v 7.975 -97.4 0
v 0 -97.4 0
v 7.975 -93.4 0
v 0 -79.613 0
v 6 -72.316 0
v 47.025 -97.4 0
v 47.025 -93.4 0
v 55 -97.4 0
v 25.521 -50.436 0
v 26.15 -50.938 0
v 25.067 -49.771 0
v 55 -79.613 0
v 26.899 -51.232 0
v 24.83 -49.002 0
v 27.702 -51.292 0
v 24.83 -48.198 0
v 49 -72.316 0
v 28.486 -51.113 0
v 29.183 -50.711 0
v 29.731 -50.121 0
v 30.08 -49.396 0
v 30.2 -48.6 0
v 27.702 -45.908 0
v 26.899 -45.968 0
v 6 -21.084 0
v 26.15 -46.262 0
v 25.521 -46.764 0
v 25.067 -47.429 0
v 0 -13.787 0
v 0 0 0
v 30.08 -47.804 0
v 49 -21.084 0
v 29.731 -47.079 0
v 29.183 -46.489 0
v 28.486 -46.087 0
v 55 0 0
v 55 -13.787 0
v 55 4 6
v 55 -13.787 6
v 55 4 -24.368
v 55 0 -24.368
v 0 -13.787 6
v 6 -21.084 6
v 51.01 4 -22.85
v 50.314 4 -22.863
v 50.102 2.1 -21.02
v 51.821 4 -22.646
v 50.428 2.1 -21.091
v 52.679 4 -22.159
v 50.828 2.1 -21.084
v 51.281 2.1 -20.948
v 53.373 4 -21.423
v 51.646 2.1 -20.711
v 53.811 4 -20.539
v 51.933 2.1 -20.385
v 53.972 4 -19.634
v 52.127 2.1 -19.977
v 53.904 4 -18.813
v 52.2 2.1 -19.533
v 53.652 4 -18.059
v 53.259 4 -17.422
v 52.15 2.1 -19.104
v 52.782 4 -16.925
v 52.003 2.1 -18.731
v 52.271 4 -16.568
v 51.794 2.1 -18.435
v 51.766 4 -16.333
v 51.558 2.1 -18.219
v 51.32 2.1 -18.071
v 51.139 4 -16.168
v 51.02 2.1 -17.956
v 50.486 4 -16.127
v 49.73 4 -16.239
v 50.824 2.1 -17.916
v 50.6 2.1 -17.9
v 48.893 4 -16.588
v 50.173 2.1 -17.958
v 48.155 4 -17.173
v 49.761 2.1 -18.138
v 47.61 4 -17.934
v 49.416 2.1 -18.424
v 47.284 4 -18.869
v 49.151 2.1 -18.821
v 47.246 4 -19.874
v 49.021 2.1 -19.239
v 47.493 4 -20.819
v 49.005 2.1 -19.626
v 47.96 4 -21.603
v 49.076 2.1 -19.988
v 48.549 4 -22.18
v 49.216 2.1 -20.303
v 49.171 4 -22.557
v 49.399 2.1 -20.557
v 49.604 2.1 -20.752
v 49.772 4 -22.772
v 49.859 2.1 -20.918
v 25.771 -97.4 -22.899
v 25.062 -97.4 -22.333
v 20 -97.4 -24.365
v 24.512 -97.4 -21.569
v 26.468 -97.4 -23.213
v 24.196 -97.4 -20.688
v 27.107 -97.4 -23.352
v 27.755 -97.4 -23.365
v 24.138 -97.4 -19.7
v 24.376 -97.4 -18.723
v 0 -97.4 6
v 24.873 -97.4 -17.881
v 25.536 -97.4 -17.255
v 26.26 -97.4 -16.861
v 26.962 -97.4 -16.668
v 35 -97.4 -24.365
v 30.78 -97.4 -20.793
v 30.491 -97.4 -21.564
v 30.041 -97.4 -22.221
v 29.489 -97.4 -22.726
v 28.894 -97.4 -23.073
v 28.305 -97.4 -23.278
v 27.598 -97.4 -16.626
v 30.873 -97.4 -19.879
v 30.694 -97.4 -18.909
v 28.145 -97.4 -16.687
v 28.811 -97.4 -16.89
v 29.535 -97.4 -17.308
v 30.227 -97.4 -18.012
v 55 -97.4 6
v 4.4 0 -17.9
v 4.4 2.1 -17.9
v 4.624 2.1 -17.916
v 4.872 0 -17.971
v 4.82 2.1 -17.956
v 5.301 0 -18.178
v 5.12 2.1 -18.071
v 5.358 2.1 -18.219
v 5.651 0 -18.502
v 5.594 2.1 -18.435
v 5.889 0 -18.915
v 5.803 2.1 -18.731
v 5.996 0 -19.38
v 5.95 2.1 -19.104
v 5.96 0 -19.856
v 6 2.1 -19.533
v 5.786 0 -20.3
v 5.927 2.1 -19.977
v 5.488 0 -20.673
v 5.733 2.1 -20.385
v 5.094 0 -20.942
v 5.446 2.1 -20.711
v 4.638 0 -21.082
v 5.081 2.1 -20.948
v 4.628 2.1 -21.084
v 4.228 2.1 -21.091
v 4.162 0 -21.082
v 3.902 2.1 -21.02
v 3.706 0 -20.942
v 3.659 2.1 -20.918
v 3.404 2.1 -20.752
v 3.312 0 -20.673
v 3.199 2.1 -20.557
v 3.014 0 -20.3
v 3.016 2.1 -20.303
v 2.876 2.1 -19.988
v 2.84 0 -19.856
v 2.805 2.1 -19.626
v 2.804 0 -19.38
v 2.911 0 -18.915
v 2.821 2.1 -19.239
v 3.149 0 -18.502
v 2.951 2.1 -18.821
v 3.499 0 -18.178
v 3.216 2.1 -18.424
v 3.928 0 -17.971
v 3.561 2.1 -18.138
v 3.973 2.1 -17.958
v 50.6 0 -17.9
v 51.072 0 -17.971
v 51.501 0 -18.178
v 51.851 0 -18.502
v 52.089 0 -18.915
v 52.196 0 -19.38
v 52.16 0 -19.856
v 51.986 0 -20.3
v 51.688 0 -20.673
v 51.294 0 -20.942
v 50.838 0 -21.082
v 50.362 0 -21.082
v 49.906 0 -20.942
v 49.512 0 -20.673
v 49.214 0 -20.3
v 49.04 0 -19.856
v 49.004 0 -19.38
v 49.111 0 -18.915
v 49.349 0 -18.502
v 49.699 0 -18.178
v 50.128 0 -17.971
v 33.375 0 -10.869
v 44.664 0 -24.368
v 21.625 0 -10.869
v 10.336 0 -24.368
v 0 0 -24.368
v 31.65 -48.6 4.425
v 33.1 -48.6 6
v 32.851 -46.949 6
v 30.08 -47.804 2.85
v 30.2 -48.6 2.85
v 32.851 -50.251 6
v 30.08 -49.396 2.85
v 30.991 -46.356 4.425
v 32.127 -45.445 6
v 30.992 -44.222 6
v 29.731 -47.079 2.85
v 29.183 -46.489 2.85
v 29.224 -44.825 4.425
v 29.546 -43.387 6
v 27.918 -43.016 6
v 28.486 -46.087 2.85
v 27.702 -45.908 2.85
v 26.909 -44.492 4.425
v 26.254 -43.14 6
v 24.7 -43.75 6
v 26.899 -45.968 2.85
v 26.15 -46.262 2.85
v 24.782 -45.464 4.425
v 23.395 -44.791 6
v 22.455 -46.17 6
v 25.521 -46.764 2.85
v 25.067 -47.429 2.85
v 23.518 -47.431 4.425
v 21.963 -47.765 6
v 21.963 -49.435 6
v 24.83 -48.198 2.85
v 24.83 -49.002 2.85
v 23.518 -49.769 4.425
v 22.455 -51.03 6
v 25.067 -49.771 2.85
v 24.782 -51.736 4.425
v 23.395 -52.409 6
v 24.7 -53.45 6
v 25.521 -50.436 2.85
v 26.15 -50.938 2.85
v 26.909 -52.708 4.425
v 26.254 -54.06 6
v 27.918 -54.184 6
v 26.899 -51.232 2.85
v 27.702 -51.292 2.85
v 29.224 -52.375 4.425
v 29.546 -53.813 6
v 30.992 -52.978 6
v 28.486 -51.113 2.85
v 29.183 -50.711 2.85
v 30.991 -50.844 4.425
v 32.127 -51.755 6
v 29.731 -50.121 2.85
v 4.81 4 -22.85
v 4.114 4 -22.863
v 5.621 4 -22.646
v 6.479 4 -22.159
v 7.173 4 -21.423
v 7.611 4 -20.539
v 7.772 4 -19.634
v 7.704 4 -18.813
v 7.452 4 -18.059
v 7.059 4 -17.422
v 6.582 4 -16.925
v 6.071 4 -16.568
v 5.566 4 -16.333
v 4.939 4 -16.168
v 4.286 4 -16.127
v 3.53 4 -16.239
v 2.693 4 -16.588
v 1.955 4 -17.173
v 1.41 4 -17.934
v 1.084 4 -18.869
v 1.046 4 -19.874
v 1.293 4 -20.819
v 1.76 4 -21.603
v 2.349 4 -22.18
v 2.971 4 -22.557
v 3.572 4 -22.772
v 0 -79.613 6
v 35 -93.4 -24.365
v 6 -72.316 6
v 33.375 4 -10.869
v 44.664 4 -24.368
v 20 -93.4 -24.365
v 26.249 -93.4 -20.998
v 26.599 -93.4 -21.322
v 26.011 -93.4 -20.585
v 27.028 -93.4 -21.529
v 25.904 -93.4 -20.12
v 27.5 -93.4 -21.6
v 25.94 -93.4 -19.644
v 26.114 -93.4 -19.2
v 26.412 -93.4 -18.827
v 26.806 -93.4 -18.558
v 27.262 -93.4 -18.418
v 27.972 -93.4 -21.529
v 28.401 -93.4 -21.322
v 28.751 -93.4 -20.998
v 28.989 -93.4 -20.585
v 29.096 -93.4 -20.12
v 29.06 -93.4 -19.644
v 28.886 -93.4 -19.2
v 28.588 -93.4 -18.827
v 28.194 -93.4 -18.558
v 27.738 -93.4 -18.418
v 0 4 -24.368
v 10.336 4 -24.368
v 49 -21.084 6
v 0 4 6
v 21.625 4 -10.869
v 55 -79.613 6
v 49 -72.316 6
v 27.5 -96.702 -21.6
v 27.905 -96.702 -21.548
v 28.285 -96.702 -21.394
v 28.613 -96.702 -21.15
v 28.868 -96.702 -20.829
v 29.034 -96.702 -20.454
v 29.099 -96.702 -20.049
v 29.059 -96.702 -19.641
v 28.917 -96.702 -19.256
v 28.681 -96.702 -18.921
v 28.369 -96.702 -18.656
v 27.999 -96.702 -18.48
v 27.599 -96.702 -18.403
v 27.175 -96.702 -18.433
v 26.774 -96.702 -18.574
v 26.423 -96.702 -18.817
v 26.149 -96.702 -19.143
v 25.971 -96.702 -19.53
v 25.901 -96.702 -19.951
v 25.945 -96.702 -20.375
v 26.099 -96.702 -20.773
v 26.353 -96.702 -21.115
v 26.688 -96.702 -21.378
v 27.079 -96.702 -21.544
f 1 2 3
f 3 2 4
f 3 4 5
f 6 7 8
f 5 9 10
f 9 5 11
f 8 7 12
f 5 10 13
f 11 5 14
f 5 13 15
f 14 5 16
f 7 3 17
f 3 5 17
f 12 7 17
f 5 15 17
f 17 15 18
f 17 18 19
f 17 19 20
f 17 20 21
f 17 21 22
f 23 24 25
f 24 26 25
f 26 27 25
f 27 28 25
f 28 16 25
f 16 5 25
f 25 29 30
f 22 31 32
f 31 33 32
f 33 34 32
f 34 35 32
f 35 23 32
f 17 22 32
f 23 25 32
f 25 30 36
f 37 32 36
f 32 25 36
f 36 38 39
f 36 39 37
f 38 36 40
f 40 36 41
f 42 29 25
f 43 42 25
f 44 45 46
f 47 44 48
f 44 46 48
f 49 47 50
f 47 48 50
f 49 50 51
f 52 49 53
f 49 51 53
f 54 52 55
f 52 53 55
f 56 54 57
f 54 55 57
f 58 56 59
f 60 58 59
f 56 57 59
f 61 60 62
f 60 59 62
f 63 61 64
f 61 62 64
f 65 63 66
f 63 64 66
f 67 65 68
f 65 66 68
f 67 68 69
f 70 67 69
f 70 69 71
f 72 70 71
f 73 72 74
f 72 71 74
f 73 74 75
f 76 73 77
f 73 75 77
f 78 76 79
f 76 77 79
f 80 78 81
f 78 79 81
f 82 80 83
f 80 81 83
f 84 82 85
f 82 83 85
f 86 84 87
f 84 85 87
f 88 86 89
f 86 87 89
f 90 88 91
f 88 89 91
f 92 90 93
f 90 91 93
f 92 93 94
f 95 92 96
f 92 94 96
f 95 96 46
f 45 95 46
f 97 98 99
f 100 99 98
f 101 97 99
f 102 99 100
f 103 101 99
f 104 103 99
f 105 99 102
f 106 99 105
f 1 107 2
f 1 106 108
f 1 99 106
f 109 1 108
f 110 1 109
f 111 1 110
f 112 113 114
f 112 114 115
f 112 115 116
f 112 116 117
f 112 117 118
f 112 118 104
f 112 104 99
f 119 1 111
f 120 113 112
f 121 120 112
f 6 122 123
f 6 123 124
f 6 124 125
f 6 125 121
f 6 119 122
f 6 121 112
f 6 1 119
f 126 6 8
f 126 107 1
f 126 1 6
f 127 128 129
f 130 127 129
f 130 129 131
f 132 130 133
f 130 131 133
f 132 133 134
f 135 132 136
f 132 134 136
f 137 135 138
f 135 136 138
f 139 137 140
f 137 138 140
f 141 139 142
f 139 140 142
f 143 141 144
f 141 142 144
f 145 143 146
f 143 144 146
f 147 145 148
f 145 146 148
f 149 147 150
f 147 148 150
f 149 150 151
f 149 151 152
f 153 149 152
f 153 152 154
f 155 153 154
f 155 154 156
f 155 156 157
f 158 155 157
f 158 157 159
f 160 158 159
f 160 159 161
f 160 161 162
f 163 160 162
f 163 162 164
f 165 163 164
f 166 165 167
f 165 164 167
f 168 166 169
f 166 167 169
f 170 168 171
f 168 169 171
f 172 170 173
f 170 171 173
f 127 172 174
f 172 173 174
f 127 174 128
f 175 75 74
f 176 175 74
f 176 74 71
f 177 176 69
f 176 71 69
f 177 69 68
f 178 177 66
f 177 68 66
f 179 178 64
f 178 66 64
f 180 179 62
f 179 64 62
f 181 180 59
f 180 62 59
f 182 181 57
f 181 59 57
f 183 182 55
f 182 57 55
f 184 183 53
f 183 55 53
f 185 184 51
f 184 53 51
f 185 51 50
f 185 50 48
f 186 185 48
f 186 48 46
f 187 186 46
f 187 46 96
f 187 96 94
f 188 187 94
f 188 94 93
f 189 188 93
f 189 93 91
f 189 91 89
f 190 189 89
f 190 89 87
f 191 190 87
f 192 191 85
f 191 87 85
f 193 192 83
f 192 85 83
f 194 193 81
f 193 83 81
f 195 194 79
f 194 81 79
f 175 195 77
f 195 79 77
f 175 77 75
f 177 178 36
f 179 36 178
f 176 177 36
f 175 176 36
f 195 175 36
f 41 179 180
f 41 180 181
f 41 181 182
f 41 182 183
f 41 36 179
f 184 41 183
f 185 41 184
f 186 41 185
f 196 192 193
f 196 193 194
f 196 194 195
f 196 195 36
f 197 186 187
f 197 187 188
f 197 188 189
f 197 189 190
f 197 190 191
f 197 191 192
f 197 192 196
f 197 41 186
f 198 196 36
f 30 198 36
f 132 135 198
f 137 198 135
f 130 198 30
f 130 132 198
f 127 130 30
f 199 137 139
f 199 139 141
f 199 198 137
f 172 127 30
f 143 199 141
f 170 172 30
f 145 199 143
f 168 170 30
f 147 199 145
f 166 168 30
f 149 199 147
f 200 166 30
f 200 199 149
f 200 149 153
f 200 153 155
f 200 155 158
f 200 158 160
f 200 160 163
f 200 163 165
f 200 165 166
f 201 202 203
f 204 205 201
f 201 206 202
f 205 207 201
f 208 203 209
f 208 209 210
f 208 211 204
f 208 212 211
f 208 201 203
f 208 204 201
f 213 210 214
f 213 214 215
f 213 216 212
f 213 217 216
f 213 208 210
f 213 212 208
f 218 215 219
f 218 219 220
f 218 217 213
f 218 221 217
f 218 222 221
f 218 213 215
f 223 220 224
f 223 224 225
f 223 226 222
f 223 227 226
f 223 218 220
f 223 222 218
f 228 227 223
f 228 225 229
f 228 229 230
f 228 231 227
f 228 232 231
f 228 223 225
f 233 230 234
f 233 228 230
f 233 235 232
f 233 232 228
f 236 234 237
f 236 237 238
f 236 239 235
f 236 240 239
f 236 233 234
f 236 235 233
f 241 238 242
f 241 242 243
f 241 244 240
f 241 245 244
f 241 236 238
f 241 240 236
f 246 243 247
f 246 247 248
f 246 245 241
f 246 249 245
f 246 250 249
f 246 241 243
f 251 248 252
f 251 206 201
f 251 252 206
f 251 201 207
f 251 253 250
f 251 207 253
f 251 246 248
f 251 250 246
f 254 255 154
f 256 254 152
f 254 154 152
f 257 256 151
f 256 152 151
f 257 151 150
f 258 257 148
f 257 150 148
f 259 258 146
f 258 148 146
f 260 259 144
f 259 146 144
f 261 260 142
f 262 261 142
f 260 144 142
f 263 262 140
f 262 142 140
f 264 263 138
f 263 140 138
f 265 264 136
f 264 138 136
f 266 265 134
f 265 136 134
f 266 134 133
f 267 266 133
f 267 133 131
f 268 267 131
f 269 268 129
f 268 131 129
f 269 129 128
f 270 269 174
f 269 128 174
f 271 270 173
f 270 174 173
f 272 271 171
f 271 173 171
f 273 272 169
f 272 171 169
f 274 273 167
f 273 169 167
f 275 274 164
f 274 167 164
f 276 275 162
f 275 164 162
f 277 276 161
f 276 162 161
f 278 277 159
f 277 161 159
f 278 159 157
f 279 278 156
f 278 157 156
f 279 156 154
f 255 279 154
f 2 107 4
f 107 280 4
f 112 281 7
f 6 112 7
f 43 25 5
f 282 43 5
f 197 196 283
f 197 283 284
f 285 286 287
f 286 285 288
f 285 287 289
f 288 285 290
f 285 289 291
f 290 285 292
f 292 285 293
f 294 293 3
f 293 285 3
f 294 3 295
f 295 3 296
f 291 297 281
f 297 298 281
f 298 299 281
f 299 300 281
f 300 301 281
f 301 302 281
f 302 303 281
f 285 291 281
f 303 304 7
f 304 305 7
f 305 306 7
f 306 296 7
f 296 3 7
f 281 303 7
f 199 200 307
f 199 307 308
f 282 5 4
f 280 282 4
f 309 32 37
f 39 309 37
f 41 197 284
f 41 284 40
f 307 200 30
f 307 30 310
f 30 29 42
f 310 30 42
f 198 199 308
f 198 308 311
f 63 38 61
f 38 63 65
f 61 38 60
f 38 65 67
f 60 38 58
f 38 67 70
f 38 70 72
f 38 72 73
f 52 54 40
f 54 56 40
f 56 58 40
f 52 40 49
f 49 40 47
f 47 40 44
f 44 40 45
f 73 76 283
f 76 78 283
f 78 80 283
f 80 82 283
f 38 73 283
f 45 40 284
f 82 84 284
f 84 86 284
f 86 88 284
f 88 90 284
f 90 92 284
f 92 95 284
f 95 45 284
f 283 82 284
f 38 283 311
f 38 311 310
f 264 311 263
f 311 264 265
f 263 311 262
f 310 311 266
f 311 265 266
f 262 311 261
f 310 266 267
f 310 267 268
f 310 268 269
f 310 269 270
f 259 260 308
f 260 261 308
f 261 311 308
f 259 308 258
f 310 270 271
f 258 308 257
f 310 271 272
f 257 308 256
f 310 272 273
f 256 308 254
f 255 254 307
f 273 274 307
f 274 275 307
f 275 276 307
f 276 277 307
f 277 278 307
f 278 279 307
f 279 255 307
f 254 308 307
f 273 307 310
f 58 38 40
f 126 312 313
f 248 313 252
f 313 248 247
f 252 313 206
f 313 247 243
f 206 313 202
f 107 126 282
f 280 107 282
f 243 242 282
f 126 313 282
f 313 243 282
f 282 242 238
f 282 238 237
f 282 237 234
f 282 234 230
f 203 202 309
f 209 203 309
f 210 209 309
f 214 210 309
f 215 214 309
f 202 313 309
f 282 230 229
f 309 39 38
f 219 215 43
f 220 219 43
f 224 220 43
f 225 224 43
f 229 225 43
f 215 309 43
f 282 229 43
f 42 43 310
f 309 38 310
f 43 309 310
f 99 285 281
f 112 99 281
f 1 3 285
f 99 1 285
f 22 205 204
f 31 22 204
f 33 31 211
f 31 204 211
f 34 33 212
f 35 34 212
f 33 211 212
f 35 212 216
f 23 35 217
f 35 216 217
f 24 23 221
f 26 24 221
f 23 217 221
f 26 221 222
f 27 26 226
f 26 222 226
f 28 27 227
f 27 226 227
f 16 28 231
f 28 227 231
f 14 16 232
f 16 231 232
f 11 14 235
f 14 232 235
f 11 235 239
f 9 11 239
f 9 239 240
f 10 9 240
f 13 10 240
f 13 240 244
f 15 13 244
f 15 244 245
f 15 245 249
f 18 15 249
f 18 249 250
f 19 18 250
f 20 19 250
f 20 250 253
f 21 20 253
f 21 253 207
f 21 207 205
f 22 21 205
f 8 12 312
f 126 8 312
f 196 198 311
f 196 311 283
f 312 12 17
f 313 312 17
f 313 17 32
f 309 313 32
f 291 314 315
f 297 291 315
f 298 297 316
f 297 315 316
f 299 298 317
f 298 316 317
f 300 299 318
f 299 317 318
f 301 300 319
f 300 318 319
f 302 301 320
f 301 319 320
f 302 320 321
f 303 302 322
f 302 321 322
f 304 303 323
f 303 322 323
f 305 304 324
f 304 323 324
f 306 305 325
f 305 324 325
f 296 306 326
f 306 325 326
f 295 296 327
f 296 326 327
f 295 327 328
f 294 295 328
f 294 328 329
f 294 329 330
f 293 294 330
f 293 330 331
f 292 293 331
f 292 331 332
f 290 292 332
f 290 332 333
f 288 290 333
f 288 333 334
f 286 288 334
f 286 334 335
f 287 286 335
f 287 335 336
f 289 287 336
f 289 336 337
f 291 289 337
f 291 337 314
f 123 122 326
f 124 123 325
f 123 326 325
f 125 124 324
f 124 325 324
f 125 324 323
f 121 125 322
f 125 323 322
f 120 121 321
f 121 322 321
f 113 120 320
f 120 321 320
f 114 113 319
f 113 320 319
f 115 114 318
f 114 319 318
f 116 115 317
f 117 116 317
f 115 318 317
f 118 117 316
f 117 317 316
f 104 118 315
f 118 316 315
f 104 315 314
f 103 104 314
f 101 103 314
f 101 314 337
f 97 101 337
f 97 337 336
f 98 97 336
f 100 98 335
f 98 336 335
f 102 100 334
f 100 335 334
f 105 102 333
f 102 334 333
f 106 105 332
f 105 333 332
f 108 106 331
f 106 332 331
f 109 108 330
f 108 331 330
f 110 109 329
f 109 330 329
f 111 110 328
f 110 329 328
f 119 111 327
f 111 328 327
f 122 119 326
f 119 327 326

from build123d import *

# Parameters (mm, degrees)
BOSS_EXTRUDE1_DEPTH = 6
BOSS_EXTRUDE2_DEPTH = 4
BOSS_EXTRUDE3_DEPTH = 4
SKETCH4_R           = 2.7
CUT_EXTRUDE1_DEPTH  = 6
SKETCH6_R           = 5.6
SKETCH5_R           = 2.7
SKETCH7_R           = 1.6
CUT_EXTRUDE2_DEPTH  = 4
SKETCH8_R           = 1.6
CUT_EXTRUDE3_DEPTH  = 4
LPATTERN1_COUNT     = 2
LPATTERN1_PITCH     = 46.2


with BuildPart() as part:
    # Sketch1 → Boss-Extrude1 (new body)
    with BuildSketch(Plane.XY):
        Polygon((55, 0), (0, 0), (0, -13.787434686), (6, -21.083714938), (6, -72.316285062), (0, -79.612565314), (0, -93.4), (55, -93.4), (55, -79.612565314), (49, -72.316285062), (49, -21.083714938), (55, -13.787434686), align=None)
    extrude(amount=BOSS_EXTRUDE1_DEPTH)

    # Sketch2 → Boss-Extrude2 (add)
    with BuildSketch(Plane(origin=(0, 0, 0), x_dir=(1, 0, 0), z_dir=(0, 1, 0))):
        Polygon((0, -6), (0, 0), (0, 24.368247755), (10.336028335, 24.368247755), (21.625062203, 10.869324577), (33.374937797, 10.869324577), (44.663971665, 24.368247755), (55, 24.368247755), (55, 0), (55, -6), align=None)
    extrude(amount=BOSS_EXTRUDE2_DEPTH)

    # Sketch3 → Boss-Extrude3 (add)
    with BuildSketch(Plane.XZ.offset(93.4)):
        Polygon((55, 6), (0, 6), (0, 0), (7.974588669, 0), (20, -24.364916427), (35, -24.364916427), (47.025411331, 0), (55, 0), align=None)
    extrude(amount=BOSS_EXTRUDE3_DEPTH)

    # Sketch4 → Cut-Extrude1 (cut)
    with BuildSketch(Plane.XY.offset(6)):
        with Locations((27.5, -48.6)):
            Circle(SKETCH4_R)
    extrude(amount=-CUT_EXTRUDE1_DEPTH, mode=Mode.SUBTRACT)

    # Sketch6 → Cut-Loft1 section 0
    with BuildSketch(Plane.XY.offset(6)):
        with Locations((27.5, -48.6)):
            Circle(SKETCH6_R)
    # Sketch5 → Cut-Loft1 section 1
    with BuildSketch(Plane.XY.offset(2.85)):
        with Locations((27.5, -48.6)):
            Circle(SKETCH5_R)
    loft(mode=Mode.SUBTRACT)

    # Sketch7 → Cut-Extrude2 (cut)
    with BuildSketch(Plane(origin=(0, 4, 0), x_dir=(1, 0, 0), z_dir=(0, 1, 0))):
        with Locations(Location((50.6, 19.5, 0), (0, 0, 270))):
            Circle(SKETCH7_R)
        with Locations(Location((4.4, 19.5, 0), (0, 0, 270))):
            Circle(SKETCH7_R)
    extrude(amount=-CUT_EXTRUDE2_DEPTH, mode=Mode.SUBTRACT)

    # Sketch8 → Cut-Extrude3 (cut)
    with BuildSketch(Plane.XZ.offset(97.4)):
        with Locations(Location((27.5, -20, 0), (0, 0, 270))):
            Circle(SKETCH8_R)
    extrude(amount=-CUT_EXTRUDE3_DEPTH, mode=Mode.SUBTRACT)

    # Cut-Loft2: read off the stored shape, not the designer's step
    # Cut-Loft2: loft between two sections, ruled curve by curve
    cut_loft2_from = [
        Edge.make_bspline([(28.144905496, -97.4, -16.687188218), (34.77052906, -97.4, -17.97699921), (33.480718067, -97.4, -24.602622774), (26.855094504, -97.4, -23.312811782), (20.22947094, -97.4, -22.02300079), (21.519281933, -97.4, -15.397377226), (28.144905496, -97.4, -16.687188218)], [0, 0, 0, 0, 0.5, 0.5, 0.5, 1, 1, 1, 1], 3, [1, 0.333333333, 0.333333333, 1, 0.333333333, 0.333333333, 1]),
    ]
    cut_loft2_to = [
        Edge.make_bspline([(26.657155547, -95.5, -21.360004864), (23.93714582, -95.5, -19.674315958), (25.622834725, -95.5, -16.954306231), (28.342844453, -95.5, -18.639995136), (31.06285418, -95.5, -20.325684042), (29.377165275, -95.5, -23.045693769), (26.657155547, -95.5, -21.360004864)], [0, 0, 0, 0, 0.5, 0.5, 0.5, 1, 1, 1, 1], 3, [1, 0.333333333, 0.333333333, 1, 0.333333333, 0.333333333, 1]),
    ]
    cut_loft2 = Solid(Shell([*[Face.make_surface_from_curves(cut_loft2_from[k], cut_loft2_to[k]) for k in range(1)], Face(Wire(cut_loft2_from)), Face(Wire(cut_loft2_to))]))
    add(cut_loft2, mode=Mode.SUBTRACT)

    # Cut-Loft3: read off the stored shape, not the designer's step
    # Cut-Loft3: loft between two sections, ruled curve by curve
    cut_loft3_from = [
        Edge.make_bspline([(50.313932129, 4, -22.862854468), (57.039641066, 4, -23.434990209), (57.611776807, 4, -16.709281273), (50.886067871, 4, -16.137145532), (44.160358934, 4, -15.565009791), (43.588223193, 4, -22.290718727), (50.313932129, 4, -22.862854468)], [0, 0, 0, 0, 0.5, 0.5, 0.5, 1, 1, 1, 1], 3, [1, 0.333333333, 0.333333333, 1, 0.333333333, 0.333333333, 1]),
    ]
    cut_loft3_to = [
        Edge.make_bspline([(50.101749949, 2.1, -21.02044299), (53.14263593, 2.1, -22.016943092), (54.139136031, 2.1, -18.976057111), (51.098250051, 2.1, -17.97955701), (48.05736407, 2.1, -16.983056908), (47.060863969, 2.1, -20.023942889), (50.101749949, 2.1, -21.02044299)], [0, 0, 0, 0, 0.5, 0.5, 0.5, 1, 1, 1, 1], 3, [1, 0.333333333, 0.333333333, 1, 0.333333333, 0.333333333, 1]),
    ]
    cut_loft3 = Solid(Shell([*[Face.make_surface_from_curves(cut_loft3_from[k], cut_loft3_to[k]) for k in range(1)], Face(Wire(cut_loft3_from)), Face(Wire(cut_loft3_to))]))
    add(cut_loft3, mode=Mode.SUBTRACT)

    # LPattern1: Cut-Loft3 ×2
    with Locations(*[(-i * LPATTERN1_PITCH, 0, 0) for i in range(1, LPATTERN1_COUNT)]):
        add(cut_loft3, mode=Mode.SUBTRACT)


solid = part.part
